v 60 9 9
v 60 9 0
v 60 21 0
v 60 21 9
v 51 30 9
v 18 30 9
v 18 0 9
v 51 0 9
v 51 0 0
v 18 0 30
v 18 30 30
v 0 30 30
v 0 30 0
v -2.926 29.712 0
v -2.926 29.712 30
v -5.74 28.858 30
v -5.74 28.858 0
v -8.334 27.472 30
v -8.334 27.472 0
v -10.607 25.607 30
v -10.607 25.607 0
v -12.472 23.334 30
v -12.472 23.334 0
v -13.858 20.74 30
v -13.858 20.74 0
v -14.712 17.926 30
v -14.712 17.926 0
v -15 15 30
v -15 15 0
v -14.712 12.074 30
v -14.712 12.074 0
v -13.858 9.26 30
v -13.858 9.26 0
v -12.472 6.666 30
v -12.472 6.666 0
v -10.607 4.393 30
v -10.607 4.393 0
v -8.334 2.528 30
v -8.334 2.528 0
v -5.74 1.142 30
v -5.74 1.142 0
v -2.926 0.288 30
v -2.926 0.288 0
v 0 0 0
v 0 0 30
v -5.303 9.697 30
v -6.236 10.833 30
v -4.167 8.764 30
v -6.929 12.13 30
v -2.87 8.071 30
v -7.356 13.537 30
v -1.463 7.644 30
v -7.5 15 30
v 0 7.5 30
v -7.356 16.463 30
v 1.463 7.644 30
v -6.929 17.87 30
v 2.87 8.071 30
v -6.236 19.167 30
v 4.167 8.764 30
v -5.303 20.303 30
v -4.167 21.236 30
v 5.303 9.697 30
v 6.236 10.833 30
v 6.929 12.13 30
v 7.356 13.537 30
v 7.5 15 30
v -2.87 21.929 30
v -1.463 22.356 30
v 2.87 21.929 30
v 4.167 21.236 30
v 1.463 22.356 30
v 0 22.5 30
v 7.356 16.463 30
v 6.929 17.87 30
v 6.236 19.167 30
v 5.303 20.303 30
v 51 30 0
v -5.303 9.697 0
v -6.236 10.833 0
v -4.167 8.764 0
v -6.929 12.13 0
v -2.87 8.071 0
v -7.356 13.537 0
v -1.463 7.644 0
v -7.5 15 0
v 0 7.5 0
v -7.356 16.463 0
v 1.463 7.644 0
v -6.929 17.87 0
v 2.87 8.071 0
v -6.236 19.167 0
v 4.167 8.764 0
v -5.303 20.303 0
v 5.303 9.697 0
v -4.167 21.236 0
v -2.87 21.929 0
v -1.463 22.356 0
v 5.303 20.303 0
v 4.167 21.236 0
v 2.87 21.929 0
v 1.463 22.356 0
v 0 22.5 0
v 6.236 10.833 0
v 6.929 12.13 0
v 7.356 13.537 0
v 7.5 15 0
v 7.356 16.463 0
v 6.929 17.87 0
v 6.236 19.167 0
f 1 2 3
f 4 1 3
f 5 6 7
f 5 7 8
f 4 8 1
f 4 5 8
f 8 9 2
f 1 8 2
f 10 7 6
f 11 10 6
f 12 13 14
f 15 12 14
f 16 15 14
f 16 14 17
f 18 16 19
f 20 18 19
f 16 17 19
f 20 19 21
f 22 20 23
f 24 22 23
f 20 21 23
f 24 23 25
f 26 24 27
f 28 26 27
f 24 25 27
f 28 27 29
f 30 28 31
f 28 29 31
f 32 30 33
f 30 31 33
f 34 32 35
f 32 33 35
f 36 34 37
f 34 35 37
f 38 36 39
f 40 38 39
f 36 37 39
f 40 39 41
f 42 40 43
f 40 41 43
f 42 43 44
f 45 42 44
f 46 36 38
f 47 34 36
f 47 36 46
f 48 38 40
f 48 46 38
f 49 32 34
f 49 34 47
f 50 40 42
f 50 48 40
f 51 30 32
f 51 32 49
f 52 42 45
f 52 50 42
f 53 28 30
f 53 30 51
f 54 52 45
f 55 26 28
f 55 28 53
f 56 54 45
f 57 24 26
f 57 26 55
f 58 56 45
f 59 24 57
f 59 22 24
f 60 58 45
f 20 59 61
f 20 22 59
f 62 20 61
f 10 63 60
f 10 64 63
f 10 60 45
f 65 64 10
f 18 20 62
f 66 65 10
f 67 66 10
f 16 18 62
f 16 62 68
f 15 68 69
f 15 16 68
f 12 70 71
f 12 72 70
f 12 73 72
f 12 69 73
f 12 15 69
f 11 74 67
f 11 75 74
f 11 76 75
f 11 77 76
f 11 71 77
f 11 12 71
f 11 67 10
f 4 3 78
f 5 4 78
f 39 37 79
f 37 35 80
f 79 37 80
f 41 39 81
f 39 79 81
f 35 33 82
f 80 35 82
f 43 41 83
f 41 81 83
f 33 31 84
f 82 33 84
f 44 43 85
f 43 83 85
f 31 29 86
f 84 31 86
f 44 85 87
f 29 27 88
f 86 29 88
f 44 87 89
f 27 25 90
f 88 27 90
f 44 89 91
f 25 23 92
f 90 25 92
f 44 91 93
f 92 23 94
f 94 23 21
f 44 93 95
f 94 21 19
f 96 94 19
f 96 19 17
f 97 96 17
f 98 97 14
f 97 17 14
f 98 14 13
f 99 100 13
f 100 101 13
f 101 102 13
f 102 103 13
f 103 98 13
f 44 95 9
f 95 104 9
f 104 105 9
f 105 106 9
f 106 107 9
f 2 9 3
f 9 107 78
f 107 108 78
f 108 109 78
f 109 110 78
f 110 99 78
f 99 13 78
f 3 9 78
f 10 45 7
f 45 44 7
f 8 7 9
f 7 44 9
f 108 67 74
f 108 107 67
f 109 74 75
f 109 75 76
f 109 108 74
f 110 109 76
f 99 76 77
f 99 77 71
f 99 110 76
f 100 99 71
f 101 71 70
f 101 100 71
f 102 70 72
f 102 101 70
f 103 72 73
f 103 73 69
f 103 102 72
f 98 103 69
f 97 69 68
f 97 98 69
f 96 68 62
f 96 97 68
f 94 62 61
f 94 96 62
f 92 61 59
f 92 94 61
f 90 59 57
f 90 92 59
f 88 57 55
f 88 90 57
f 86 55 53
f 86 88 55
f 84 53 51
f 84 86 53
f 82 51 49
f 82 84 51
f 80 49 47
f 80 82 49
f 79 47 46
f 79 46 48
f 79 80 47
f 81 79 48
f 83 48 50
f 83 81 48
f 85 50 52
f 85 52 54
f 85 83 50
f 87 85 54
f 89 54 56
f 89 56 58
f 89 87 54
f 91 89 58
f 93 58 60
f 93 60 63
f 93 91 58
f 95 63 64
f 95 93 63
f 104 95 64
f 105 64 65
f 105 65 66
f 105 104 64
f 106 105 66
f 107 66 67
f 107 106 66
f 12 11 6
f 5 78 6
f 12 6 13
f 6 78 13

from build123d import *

# Parameters (mm, degrees)
F0_R     = 7.5
F1_DEPTH = 9
F2_R     = 7.5
F3_DEPTH = 21


with BuildPart() as f1:
    # F0 (on Top) → F1 (new body)
    with BuildSketch(Plane.XY):
        with BuildLine():
            ThreePointArc((0, 30), (-15, 15), (0, 0))
            Line((0, 0), (51, 0))
            Line((51, 0), (60, 9))
            Line((60, 9), (60, 21))
            Line((60, 21), (51, 30))
            Line((51, 30), (18, 30))
            Line((18, 30), (0, 30))
        make_face()
        with Locations((0, 15)):
            Circle(F0_R, mode=Mode.SUBTRACT)
    extrude(amount=F1_DEPTH)

    # F2 (on face) → F3 (join)
    with BuildSketch(Plane.XY.offset(9)):
        with BuildLine():
            ThreePointArc((0, 30), (-15, 15), (0, 0))
            Line((0, 0), (18, 0))
            Line((18, 0), (18, 30))
            Line((18, 30), (0, 30))
        make_face()
        with Locations((0, 15)):
            Circle(F2_R, mode=Mode.SUBTRACT)
    extrude(amount=F3_DEPTH)


solid = f1.part
